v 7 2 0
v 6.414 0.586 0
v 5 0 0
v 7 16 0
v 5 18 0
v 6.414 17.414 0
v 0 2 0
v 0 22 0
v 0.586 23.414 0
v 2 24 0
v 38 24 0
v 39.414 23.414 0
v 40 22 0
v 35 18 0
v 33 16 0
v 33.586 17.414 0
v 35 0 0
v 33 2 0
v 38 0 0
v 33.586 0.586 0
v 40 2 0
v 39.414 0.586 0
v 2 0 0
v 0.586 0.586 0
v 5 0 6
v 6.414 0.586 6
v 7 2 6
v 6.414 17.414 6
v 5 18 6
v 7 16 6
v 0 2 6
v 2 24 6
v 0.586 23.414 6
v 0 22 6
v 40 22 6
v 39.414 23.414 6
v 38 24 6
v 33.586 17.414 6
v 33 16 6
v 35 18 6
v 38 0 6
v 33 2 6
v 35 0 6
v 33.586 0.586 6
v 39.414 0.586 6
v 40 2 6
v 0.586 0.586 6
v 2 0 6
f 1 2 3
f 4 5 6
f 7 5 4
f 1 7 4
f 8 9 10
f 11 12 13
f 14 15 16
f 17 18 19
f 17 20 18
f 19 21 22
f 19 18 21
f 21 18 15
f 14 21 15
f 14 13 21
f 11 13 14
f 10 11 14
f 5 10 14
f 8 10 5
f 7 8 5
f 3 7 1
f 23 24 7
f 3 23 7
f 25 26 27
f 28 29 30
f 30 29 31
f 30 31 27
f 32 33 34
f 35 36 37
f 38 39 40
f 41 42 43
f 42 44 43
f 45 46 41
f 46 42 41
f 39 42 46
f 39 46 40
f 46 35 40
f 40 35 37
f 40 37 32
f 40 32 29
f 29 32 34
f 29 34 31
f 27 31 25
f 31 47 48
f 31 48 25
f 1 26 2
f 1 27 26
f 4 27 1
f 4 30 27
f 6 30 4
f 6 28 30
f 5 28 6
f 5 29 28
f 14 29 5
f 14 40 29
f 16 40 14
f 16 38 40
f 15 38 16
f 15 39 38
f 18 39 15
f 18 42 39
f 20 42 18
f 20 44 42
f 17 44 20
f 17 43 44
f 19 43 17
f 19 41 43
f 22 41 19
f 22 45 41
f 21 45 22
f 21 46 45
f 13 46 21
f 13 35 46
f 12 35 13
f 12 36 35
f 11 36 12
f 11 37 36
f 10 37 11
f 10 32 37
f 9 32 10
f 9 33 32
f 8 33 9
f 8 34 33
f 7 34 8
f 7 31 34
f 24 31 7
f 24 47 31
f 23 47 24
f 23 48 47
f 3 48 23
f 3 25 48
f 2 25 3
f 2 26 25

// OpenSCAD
$fn = 32;

// ----------------------------------------------------------------------
// Clip blank: staple clip, 6 mm thick
// ----------------------------------------------------------------------

// --- parameters (mm) ---
profile_height = 6;       // extrusion height
profile_points = 24;      // points of the closed outline

profile = [[0, 2], [0.586, 0.586], [2, 0], [5, 0], [6.414, 0.586], [7, 2], [7, 16], [6.414, 17.414], [5, 18], [35, 18], [33.586, 17.414], [33, 16], [33, 2], [33.586, 0.586], [35, 0], [38, 0], [39.414, 0.586], [40, 2], [40, 22], [39.414, 23.414], [38, 24], [2, 24], [0.586, 23.414], [0, 22]];  // single closed polygon, 24 points, counter clockwise

// --- the one profile operation ---
linear_extrude(height = profile_height) polygon(points = profile);
